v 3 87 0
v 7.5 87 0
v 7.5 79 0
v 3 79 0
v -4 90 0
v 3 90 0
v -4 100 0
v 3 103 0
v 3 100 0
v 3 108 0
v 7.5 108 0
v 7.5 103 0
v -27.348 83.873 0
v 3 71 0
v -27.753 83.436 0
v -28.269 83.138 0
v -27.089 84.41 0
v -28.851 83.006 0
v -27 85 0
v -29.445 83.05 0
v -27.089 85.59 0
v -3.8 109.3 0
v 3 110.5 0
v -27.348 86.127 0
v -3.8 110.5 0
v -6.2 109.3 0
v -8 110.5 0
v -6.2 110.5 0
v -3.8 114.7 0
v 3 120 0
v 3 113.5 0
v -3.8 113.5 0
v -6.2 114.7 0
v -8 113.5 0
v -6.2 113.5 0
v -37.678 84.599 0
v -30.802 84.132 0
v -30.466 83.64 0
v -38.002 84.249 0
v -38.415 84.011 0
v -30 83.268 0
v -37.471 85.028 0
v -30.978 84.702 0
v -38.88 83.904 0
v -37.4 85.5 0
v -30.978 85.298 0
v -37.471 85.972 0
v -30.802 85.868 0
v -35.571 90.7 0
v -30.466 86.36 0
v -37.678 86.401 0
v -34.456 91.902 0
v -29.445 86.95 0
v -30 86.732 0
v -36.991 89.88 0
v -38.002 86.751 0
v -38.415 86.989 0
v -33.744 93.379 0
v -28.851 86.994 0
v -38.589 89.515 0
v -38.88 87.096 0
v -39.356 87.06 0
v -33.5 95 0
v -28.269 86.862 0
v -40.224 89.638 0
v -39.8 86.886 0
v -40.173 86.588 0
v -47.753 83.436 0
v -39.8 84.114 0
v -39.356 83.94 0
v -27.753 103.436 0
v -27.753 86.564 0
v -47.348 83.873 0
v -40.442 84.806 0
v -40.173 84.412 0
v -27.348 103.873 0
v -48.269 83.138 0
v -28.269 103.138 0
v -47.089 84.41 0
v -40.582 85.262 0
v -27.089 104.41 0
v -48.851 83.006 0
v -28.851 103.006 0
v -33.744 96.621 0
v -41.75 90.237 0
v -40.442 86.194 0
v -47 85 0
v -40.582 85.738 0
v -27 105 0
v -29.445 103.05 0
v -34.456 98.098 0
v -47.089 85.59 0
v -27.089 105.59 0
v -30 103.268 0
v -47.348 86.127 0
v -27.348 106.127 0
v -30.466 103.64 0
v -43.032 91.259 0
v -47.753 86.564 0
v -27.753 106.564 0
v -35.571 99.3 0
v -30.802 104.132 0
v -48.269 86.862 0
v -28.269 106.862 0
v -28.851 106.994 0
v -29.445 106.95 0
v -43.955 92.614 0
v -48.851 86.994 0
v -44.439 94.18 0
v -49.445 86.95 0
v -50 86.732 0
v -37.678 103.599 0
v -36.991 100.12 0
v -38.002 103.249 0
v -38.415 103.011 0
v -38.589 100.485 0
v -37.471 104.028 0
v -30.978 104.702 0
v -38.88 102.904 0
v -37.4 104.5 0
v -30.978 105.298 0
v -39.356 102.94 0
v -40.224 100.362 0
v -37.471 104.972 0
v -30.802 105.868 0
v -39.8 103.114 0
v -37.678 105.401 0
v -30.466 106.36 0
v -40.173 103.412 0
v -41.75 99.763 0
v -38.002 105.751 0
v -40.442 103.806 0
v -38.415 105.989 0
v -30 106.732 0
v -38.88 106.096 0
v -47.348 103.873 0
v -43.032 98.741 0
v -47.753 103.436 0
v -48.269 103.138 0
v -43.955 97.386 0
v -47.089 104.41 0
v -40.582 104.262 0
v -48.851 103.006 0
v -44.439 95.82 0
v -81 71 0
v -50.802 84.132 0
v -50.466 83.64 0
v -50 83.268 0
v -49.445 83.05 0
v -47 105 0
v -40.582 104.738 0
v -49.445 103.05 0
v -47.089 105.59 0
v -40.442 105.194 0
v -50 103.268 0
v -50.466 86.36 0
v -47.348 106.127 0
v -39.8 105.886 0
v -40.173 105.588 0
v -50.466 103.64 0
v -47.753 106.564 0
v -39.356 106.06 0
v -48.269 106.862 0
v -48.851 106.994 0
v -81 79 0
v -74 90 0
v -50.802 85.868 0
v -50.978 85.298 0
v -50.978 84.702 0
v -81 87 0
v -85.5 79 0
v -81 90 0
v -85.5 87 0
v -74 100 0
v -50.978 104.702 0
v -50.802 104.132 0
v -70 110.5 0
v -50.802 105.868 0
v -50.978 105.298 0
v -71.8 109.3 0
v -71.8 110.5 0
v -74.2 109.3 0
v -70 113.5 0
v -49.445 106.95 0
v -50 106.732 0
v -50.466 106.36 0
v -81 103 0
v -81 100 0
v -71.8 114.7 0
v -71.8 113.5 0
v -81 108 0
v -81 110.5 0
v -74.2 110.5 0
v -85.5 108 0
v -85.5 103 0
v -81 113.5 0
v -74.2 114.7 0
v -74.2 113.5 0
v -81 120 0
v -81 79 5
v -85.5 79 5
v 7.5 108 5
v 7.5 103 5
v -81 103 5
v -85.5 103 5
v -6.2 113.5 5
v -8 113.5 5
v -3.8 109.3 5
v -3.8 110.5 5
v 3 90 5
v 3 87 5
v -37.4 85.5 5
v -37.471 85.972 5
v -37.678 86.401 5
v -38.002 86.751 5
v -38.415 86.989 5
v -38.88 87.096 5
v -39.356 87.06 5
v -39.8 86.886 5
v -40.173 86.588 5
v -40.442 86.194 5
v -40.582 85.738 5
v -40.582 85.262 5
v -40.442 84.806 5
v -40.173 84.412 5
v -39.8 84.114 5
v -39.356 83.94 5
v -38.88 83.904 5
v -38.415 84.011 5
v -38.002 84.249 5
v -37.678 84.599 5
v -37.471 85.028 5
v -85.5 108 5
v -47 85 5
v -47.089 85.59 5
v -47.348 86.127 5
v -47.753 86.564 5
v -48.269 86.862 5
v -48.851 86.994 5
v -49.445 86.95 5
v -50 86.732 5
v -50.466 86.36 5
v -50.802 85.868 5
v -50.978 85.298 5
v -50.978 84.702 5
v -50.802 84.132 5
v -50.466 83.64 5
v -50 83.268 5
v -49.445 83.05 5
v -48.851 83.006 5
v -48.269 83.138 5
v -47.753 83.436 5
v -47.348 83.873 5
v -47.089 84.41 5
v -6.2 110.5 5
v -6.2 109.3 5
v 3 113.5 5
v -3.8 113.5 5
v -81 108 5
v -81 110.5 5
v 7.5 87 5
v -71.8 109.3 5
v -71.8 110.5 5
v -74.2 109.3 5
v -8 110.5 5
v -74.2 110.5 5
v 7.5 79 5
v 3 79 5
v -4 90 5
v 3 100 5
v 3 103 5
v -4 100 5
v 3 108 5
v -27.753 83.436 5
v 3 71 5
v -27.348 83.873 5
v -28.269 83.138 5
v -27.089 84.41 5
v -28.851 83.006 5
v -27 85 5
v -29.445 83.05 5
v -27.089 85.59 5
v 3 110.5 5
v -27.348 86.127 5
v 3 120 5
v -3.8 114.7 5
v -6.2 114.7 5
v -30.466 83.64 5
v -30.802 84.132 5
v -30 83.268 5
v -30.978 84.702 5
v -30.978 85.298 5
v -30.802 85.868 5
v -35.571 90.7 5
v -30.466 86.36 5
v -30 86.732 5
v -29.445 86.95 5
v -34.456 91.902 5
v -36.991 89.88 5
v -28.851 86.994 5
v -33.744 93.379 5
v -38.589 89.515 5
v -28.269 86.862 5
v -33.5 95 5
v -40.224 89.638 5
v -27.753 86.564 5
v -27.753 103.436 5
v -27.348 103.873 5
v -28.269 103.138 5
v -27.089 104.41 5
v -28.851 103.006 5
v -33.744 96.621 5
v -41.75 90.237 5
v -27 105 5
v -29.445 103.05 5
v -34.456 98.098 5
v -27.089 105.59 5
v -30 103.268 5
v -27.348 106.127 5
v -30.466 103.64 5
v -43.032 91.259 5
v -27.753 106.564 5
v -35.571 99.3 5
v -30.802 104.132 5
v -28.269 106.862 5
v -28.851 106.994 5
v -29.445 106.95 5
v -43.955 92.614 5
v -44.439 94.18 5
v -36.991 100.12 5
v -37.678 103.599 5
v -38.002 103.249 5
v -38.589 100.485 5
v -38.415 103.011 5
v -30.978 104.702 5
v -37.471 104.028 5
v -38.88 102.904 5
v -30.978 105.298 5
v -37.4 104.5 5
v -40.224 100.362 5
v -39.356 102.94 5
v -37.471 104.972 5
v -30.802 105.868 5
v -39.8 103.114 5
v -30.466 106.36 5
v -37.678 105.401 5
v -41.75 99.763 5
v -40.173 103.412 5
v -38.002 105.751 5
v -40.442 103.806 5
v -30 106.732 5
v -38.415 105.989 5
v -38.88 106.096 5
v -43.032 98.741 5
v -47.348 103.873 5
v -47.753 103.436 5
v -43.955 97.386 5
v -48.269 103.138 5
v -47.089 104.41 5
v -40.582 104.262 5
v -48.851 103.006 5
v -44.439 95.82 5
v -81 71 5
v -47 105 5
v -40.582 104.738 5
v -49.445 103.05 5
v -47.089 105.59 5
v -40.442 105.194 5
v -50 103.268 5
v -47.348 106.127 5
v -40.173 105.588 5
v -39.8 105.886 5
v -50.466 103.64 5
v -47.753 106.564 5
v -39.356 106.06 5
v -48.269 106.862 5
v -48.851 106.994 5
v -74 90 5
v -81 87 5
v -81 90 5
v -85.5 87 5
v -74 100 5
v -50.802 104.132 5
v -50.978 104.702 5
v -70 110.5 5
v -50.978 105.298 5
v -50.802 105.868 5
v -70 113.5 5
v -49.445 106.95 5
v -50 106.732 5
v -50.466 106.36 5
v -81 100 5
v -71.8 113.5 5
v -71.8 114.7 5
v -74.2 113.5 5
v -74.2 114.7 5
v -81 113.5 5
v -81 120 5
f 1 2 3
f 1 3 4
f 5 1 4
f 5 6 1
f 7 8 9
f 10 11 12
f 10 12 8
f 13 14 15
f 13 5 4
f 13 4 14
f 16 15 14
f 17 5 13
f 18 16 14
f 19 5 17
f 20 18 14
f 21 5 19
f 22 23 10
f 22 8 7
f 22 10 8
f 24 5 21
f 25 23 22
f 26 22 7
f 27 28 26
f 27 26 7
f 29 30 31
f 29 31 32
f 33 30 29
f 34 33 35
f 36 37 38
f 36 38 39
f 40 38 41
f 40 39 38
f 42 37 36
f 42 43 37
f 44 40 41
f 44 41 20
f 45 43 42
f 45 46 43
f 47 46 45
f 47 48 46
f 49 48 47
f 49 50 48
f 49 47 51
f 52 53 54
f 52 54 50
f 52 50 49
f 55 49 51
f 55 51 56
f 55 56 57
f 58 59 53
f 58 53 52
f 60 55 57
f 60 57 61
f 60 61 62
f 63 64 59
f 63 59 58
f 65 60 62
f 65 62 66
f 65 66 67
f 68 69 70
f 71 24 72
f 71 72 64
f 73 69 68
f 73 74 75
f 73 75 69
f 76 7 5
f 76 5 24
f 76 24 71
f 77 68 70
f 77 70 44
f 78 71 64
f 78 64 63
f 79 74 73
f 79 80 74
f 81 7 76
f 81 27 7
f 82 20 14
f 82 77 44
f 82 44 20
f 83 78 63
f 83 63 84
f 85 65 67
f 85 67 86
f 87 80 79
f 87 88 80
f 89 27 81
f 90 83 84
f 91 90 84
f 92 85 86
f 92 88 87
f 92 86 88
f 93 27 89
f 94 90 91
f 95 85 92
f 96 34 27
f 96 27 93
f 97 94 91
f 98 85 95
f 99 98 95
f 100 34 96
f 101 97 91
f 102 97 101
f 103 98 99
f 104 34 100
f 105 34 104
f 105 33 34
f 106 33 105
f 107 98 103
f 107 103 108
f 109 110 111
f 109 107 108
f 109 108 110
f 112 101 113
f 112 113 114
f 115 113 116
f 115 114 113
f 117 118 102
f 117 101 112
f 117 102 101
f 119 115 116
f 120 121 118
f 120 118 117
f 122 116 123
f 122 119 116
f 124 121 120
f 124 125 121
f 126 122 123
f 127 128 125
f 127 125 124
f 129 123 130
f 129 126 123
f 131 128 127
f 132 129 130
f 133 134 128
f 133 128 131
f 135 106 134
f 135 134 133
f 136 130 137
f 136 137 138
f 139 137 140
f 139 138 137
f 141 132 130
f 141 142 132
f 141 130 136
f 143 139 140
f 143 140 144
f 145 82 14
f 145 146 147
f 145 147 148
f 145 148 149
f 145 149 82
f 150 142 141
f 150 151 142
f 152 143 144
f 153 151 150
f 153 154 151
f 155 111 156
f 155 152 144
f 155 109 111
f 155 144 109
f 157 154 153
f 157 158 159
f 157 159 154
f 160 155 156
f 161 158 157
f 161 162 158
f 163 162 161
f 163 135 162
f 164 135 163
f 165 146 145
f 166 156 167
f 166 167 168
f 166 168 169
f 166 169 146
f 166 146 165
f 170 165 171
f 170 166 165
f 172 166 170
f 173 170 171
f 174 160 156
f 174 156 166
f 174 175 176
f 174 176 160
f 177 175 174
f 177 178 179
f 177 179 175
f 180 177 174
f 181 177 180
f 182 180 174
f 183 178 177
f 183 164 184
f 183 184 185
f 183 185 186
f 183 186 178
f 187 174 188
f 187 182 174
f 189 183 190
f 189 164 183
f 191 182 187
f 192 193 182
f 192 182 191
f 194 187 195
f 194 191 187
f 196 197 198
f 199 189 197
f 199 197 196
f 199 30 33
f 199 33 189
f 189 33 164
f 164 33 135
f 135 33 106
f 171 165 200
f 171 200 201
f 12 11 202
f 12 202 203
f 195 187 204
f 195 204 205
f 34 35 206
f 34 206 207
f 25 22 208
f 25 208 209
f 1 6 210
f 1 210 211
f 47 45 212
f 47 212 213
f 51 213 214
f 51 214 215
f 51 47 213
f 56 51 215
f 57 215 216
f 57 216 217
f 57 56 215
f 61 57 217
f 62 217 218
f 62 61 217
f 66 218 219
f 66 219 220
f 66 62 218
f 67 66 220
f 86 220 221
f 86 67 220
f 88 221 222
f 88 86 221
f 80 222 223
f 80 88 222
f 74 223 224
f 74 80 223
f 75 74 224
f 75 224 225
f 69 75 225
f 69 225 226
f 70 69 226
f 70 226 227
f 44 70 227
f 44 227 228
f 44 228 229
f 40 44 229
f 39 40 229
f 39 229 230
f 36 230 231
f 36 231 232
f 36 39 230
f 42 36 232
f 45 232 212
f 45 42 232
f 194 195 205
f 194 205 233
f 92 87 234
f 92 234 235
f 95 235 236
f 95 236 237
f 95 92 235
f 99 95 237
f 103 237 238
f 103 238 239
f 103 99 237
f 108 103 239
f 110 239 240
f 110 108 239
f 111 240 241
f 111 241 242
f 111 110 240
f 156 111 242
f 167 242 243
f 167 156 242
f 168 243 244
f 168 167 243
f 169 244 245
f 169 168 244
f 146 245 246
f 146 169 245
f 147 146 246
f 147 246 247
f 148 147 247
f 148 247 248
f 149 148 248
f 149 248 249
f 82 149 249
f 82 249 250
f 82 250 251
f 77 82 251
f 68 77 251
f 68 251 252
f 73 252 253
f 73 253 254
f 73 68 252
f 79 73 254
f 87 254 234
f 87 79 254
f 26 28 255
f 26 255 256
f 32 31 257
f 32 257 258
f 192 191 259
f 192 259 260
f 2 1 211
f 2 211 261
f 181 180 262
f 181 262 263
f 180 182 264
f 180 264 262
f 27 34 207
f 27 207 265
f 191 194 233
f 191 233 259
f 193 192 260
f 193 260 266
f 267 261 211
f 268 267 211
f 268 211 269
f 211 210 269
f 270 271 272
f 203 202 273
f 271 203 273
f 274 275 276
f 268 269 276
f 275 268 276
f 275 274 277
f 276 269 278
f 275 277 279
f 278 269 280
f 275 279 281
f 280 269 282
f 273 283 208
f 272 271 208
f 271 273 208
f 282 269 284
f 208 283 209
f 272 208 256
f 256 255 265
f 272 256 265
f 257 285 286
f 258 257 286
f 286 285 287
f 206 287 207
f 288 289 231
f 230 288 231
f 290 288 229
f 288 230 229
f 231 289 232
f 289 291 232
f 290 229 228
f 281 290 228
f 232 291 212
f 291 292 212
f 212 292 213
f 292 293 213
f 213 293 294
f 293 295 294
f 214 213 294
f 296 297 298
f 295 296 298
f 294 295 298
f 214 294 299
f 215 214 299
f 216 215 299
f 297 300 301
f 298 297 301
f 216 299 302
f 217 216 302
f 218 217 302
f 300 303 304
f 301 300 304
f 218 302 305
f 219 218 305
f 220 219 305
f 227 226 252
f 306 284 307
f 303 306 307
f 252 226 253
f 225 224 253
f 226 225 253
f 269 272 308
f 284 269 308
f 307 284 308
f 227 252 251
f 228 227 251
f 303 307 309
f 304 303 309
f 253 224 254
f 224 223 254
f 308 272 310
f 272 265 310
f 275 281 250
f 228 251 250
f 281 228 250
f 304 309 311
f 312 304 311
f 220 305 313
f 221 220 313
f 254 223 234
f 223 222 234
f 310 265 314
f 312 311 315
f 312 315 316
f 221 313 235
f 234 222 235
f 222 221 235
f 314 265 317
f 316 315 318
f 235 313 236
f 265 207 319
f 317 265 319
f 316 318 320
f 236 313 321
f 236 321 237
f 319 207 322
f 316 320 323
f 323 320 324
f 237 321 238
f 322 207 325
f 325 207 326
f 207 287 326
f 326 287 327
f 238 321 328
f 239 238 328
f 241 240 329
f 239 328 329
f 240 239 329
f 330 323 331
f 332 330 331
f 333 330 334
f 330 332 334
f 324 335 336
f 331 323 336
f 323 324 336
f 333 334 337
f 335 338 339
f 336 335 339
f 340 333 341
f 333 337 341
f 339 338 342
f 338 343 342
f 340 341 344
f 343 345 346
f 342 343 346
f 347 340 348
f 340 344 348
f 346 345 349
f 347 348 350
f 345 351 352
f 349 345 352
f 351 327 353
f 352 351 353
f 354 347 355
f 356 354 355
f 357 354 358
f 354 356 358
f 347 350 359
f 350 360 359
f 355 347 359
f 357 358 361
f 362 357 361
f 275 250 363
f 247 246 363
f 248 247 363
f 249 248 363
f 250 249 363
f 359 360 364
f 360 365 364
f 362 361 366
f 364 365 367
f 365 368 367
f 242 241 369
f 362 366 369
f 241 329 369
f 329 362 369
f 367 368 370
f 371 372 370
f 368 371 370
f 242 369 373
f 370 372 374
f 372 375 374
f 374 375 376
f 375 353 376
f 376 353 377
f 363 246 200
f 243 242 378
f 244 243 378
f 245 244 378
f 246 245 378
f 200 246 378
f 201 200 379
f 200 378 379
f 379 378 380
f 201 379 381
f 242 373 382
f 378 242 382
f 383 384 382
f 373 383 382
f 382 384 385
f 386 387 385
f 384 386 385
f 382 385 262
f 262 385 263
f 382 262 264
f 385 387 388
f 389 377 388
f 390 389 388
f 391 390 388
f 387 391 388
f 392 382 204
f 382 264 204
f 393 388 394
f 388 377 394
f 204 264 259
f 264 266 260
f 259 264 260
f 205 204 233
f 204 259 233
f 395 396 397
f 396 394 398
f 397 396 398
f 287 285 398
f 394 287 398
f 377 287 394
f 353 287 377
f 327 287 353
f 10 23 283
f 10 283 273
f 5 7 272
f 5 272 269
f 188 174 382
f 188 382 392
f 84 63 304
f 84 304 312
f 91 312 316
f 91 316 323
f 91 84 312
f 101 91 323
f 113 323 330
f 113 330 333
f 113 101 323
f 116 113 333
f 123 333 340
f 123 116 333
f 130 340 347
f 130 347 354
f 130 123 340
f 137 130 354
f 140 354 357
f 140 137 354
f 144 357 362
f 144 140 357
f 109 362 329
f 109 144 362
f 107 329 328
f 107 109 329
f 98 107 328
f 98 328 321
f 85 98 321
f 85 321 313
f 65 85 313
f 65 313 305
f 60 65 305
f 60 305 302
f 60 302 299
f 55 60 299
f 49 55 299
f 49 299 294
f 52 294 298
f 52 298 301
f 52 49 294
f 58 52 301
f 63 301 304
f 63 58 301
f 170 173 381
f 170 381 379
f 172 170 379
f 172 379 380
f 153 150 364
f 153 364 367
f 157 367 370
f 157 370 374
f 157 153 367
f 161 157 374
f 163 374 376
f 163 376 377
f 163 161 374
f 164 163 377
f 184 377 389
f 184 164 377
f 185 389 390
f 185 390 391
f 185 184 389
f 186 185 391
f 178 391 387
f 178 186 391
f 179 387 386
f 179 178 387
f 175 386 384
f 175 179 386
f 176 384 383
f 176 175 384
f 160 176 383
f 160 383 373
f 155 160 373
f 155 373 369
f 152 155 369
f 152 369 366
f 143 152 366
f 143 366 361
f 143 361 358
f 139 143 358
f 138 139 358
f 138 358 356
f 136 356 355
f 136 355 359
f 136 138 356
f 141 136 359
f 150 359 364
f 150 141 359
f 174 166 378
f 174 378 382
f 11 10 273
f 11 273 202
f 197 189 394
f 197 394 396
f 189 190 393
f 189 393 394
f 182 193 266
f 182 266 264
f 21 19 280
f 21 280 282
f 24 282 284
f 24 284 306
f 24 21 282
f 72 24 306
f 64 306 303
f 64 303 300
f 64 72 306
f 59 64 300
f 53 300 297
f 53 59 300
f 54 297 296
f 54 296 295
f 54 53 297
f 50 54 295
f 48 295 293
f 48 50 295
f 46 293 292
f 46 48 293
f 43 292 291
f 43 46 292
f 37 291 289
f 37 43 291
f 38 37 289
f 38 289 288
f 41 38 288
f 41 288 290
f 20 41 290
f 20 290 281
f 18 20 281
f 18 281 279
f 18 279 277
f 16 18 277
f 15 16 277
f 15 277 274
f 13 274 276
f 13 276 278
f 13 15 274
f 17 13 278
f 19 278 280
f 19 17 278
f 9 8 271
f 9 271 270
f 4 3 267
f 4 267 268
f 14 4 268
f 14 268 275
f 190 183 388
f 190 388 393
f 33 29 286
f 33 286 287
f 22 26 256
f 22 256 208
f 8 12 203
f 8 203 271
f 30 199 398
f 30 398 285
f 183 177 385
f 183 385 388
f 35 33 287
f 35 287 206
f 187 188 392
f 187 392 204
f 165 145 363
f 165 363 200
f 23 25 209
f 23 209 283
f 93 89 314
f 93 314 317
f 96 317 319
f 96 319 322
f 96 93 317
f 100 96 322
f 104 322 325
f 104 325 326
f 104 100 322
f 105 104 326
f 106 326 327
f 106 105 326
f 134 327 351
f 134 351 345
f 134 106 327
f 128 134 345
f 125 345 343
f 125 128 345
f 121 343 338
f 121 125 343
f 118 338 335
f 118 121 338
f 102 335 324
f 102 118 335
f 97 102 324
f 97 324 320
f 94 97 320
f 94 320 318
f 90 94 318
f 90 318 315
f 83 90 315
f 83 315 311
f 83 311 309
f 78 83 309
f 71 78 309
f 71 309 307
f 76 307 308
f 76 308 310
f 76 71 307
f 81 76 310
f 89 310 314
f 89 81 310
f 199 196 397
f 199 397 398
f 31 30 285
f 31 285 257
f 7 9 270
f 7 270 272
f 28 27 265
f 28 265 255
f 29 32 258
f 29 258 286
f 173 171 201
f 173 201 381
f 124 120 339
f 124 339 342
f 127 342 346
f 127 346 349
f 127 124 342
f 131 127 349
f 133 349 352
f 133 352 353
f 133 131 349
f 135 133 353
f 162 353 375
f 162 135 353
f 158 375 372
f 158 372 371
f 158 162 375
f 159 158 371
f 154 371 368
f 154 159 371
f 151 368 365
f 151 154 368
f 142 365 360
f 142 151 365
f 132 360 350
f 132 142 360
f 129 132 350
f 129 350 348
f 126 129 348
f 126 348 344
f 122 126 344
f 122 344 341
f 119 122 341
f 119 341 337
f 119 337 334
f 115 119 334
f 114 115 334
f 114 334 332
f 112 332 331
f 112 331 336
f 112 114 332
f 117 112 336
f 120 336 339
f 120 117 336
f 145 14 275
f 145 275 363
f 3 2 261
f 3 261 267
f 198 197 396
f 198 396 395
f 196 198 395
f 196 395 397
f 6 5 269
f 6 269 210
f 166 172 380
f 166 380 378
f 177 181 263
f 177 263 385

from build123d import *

# Parameters (mm, degrees)
MODEL_R                  = 1.6
MODEL_R_2                = 2
MODEL_R_3                = 5.5
RESSALTO_EXTRUS_O1_DEPTH = 5


with BuildPart() as part:
    # Model → Ressalto-extrusão1 (new body)
    with BuildSketch(Plane.XY):
        Polygon((-6.199999159, 114.700001655), (-6.199999159, 113.500001714), (-7.999999159, 113.500001714), (-7.999999159, 110.500001669), (-6.199999159, 110.500001669), (-6.199999159, 109.300001727), (-3.799999815, 109.300001727), (-3.799999815, 110.500001669), (3.000000179, 110.500001669), (3.000000179, 108.000001654), (7.500000924, 108.000001654), (7.500000924, 103.000001535), (3.000000179, 103.000001535), (3.000000179, 100.00000149), (-3.999999195, 100.00000149), (-3.999999195, 90.000001341), (3.000000179, 90.000001341), (3.000000179, 87.000001296), (7.500000924, 87.000001296), (7.500000924, 79.000001177), (3.000000179, 79.000001177), (3.000000179, 71.000001058), (-80.999999166, 71.000001058), (-80.999999166, 79.000001177), (-85.499999911, 79.000001177), (-85.499999911, 87.000001296), (-80.999999166, 87.000001296), (-80.999999166, 90.000001341), (-73.999999791, 90.000001341), (-73.999999791, 100.00000149), (-80.999999166, 100.00000149), (-80.999999166, 103.000001535), (-85.499999911, 103.000001535), (-85.499999911, 108.000001654), (-80.999999166, 108.000001654), (-80.999999166, 110.500001669), (-74.199999172, 110.500001669), (-74.199999172, 109.300001727), (-71.799999827, 109.300001727), (-71.799999827, 110.500001669), (-69.999999827, 110.500001669), (-69.999999827, 113.500001714), (-71.799999827, 113.500001714), (-71.799999827, 114.700001655), (-74.199999172, 114.700001655), (-74.199999172, 113.500001714), (-80.999999166, 113.500001714), (-80.999999166, 120.000001773), (3.000000179, 120.000001773), (3.000000179, 113.500001714), (-3.799999815, 113.500001714), (-3.799999815, 114.700001655), align=None)
        with Locations((-38.999999449, 85.500001416)):
            Circle(MODEL_R, mode=Mode.SUBTRACT)
        with Locations((-29.000000507, 105.000001535)):
            Circle(MODEL_R_2, mode=Mode.SUBTRACT)
        with Locations((-38.999999449, 104.500001416)):
            Circle(MODEL_R, mode=Mode.SUBTRACT)
        with Locations((-49.000000507, 85.000001296)):
            Circle(MODEL_R_2, mode=Mode.SUBTRACT)
        with Locations((-49.000000507, 105.000001535)):
            Circle(MODEL_R_2, mode=Mode.SUBTRACT)
        with Locations((-38.999999493, 95.000001416)):
            Circle(MODEL_R_3, mode=Mode.SUBTRACT)
        with Locations((-29.000000507, 85.000001296)):
            Circle(MODEL_R_2, mode=Mode.SUBTRACT)
    extrude(amount=RESSALTO_EXTRUS_O1_DEPTH)


solid = part.part
